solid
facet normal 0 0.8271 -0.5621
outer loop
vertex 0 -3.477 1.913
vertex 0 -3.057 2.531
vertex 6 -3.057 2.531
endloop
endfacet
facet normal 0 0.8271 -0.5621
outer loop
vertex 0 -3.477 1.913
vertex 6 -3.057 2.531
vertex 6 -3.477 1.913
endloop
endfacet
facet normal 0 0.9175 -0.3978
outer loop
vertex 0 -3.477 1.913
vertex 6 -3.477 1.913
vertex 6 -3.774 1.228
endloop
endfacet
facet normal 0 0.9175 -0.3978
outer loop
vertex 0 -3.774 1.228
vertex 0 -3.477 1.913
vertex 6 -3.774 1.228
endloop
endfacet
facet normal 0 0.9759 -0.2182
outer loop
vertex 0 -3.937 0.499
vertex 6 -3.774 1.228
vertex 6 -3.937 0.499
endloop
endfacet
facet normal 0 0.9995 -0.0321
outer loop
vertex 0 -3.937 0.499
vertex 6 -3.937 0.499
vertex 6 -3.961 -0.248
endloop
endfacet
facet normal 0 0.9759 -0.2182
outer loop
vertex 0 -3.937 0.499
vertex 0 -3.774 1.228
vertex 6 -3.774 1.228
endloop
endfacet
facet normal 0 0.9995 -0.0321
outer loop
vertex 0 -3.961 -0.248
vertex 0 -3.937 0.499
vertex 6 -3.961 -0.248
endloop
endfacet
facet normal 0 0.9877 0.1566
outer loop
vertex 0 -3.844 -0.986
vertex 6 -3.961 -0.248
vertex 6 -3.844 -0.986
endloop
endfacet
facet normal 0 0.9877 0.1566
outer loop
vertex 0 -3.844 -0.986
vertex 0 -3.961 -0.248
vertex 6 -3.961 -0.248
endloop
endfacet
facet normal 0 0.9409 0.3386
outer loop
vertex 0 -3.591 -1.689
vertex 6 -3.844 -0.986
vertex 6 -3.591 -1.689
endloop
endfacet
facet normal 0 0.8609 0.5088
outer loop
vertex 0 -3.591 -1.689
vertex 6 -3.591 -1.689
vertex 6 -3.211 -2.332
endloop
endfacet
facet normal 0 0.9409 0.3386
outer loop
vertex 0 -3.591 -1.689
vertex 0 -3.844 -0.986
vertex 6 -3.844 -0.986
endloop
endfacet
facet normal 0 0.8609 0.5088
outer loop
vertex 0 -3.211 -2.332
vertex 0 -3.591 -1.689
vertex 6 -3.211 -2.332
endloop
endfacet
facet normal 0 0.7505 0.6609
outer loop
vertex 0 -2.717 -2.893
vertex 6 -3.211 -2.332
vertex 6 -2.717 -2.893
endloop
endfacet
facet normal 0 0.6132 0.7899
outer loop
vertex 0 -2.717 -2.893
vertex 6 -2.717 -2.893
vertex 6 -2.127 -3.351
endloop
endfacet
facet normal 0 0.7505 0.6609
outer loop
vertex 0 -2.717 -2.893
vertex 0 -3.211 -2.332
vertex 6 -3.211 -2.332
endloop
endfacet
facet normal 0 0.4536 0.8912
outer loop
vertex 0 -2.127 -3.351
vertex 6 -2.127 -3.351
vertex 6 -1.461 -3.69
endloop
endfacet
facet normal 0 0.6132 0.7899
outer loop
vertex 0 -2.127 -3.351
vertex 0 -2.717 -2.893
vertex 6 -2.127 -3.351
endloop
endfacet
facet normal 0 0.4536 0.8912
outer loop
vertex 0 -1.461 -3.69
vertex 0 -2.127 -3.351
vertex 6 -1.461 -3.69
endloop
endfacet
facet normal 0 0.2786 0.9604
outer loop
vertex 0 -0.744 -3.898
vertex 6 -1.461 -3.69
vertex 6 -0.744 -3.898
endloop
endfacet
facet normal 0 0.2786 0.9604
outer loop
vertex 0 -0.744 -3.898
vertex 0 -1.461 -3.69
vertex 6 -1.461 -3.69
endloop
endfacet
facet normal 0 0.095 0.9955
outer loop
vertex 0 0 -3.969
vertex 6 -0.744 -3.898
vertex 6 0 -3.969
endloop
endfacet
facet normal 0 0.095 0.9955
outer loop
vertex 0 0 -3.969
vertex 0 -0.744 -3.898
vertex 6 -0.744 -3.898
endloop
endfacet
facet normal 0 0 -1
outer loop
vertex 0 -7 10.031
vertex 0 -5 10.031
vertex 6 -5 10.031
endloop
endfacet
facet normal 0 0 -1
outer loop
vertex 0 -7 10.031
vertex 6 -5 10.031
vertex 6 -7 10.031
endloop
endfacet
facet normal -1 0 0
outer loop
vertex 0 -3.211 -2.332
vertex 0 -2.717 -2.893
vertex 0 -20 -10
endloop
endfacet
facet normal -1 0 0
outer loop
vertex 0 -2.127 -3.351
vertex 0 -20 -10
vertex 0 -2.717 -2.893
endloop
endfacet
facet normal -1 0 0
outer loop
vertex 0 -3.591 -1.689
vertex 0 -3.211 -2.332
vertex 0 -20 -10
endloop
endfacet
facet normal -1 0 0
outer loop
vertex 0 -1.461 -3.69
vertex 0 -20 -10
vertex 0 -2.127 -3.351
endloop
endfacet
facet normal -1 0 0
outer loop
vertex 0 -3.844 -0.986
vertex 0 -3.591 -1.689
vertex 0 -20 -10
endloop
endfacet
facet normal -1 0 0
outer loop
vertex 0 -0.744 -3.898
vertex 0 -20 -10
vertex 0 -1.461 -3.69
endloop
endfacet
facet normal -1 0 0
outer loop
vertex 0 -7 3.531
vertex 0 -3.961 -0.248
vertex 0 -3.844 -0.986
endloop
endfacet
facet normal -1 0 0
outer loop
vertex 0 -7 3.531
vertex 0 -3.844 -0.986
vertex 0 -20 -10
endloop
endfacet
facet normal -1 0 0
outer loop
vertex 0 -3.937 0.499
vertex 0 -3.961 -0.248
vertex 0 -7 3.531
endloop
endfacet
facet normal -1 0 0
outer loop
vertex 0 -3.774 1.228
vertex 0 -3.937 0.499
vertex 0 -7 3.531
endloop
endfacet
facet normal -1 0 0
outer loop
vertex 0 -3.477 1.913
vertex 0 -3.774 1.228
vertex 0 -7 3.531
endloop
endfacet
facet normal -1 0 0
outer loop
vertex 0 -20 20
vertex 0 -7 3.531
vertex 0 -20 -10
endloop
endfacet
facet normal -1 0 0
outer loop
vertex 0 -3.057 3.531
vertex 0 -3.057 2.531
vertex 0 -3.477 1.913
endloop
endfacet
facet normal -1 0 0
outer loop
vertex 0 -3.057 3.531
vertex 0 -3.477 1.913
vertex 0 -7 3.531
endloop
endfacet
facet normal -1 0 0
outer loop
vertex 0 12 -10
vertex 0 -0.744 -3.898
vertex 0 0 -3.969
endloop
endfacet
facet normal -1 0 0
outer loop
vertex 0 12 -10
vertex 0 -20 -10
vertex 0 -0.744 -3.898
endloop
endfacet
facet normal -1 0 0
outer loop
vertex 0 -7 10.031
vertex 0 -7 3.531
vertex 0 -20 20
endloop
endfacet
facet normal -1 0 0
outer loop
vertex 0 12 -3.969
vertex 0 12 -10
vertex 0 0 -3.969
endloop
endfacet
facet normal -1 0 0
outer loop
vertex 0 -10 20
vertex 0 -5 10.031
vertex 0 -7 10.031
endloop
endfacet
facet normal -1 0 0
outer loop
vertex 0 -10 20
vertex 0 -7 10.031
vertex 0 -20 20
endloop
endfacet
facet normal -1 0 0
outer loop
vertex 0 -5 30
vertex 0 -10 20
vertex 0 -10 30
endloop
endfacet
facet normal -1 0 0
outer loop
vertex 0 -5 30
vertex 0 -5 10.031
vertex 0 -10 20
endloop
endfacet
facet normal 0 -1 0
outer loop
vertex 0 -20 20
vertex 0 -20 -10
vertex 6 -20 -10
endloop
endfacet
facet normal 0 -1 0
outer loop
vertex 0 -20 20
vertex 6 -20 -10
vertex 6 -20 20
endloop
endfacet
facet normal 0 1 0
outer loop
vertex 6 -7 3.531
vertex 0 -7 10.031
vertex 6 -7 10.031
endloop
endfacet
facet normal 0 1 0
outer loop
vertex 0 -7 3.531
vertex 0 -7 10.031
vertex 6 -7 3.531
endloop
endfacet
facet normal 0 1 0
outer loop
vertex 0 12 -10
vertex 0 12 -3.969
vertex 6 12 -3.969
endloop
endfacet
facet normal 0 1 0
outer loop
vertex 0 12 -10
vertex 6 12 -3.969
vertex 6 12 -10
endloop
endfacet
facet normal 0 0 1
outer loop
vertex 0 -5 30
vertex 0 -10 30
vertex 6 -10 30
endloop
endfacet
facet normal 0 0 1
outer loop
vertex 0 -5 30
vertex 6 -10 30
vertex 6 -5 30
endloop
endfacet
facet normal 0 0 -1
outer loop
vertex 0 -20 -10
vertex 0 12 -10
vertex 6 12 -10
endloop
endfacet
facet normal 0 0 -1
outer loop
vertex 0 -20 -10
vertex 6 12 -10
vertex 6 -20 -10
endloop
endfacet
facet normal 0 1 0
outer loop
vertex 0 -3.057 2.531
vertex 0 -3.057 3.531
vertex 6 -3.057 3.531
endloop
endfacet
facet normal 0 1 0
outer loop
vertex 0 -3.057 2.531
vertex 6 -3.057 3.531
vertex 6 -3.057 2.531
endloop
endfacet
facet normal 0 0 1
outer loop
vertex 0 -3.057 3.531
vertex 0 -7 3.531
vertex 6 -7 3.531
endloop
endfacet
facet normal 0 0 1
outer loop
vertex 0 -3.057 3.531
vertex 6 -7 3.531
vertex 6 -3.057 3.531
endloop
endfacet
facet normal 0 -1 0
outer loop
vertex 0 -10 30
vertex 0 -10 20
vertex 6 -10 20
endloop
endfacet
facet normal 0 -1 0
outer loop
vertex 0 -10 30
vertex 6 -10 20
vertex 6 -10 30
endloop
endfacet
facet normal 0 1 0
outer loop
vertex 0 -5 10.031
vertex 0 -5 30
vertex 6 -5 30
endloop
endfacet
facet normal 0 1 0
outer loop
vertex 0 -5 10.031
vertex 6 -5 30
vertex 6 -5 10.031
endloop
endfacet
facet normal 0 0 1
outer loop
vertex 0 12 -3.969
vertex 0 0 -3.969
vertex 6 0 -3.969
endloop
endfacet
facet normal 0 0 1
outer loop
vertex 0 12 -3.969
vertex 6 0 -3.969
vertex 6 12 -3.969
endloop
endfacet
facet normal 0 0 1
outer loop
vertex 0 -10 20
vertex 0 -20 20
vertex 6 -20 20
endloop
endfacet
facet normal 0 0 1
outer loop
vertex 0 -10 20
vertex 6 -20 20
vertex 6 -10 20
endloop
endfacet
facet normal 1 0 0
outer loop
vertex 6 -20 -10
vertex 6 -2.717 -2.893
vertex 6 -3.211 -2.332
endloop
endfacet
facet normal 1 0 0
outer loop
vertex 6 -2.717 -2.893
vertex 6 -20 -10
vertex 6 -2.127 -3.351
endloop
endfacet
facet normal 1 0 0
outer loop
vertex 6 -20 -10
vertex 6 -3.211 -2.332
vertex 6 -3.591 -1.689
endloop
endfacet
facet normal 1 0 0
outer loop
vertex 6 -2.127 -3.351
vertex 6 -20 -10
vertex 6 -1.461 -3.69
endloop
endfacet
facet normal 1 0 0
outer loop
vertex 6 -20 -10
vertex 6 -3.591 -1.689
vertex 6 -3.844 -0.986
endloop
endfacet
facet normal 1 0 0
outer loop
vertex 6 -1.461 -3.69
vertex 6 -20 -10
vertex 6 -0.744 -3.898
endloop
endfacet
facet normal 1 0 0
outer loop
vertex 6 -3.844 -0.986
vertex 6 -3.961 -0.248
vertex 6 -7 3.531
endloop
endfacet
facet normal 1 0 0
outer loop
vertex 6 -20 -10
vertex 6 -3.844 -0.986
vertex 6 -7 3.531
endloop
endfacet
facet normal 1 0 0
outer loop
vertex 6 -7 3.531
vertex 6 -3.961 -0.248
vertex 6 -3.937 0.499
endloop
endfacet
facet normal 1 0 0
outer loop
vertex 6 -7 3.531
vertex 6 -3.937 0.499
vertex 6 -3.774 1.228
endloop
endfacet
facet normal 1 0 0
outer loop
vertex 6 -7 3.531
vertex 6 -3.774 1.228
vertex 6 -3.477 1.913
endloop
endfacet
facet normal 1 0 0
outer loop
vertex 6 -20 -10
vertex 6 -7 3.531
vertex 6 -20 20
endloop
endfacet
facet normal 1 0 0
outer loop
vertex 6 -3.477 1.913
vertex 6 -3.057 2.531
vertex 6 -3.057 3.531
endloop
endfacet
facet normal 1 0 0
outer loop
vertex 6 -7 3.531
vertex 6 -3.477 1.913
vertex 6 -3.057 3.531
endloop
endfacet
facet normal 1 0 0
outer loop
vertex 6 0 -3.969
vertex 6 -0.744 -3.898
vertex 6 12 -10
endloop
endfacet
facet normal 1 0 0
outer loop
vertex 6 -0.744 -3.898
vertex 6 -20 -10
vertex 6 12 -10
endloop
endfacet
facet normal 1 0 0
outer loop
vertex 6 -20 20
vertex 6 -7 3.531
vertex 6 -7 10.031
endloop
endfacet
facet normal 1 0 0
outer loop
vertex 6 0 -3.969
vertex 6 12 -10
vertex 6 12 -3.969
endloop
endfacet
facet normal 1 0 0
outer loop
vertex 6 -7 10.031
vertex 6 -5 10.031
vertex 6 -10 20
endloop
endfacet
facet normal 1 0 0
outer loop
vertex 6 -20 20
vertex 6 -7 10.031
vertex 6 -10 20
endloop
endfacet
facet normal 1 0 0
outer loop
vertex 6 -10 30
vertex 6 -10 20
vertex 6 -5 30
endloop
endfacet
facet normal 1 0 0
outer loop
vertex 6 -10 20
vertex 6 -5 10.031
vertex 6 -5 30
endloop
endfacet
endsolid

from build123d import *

# Parameters (mm, degrees)
BOSS_EXTRUDE1_DEPTH = 6


with BuildPart() as part:
    # Sketch1 → Boss-Extrude1 (new body)
    with BuildSketch(Plane(origin=(0, 0, 0), x_dir=(0, 0, -1), z_dir=(1, 0, 0))):
        with BuildLine():
            Line((3.96875, 0), (3.96875, 12))
            Line((3.96875, 12), (10, 12))
            Line((10, 12), (10, -20))
            Line((10, -20), (-20, -20))
            Line((-20, -20), (-20, -10))
            Line((-20, -10), (-30, -10))
            Line((-30, -10), (-30, -5))
            Line((-30, -5), (-10.03125, -5))
            Line((-10.03125, -5), (-10.03125, -7))
            Line((-10.03125, -7), (-3.53125, -7))
            Line((-3.53125, -7), (-3.53125, -3.056754815))
            Line((-3.53125, -3.056754815), (-2.53125, -3.056754815))
            ThreePointArc((-2.53125, -3.056754815), (1.68894614, -3.591439475), (3.96875, 0))
        make_face()
    extrude(amount=BOSS_EXTRUDE1_DEPTH)


solid = part.part
